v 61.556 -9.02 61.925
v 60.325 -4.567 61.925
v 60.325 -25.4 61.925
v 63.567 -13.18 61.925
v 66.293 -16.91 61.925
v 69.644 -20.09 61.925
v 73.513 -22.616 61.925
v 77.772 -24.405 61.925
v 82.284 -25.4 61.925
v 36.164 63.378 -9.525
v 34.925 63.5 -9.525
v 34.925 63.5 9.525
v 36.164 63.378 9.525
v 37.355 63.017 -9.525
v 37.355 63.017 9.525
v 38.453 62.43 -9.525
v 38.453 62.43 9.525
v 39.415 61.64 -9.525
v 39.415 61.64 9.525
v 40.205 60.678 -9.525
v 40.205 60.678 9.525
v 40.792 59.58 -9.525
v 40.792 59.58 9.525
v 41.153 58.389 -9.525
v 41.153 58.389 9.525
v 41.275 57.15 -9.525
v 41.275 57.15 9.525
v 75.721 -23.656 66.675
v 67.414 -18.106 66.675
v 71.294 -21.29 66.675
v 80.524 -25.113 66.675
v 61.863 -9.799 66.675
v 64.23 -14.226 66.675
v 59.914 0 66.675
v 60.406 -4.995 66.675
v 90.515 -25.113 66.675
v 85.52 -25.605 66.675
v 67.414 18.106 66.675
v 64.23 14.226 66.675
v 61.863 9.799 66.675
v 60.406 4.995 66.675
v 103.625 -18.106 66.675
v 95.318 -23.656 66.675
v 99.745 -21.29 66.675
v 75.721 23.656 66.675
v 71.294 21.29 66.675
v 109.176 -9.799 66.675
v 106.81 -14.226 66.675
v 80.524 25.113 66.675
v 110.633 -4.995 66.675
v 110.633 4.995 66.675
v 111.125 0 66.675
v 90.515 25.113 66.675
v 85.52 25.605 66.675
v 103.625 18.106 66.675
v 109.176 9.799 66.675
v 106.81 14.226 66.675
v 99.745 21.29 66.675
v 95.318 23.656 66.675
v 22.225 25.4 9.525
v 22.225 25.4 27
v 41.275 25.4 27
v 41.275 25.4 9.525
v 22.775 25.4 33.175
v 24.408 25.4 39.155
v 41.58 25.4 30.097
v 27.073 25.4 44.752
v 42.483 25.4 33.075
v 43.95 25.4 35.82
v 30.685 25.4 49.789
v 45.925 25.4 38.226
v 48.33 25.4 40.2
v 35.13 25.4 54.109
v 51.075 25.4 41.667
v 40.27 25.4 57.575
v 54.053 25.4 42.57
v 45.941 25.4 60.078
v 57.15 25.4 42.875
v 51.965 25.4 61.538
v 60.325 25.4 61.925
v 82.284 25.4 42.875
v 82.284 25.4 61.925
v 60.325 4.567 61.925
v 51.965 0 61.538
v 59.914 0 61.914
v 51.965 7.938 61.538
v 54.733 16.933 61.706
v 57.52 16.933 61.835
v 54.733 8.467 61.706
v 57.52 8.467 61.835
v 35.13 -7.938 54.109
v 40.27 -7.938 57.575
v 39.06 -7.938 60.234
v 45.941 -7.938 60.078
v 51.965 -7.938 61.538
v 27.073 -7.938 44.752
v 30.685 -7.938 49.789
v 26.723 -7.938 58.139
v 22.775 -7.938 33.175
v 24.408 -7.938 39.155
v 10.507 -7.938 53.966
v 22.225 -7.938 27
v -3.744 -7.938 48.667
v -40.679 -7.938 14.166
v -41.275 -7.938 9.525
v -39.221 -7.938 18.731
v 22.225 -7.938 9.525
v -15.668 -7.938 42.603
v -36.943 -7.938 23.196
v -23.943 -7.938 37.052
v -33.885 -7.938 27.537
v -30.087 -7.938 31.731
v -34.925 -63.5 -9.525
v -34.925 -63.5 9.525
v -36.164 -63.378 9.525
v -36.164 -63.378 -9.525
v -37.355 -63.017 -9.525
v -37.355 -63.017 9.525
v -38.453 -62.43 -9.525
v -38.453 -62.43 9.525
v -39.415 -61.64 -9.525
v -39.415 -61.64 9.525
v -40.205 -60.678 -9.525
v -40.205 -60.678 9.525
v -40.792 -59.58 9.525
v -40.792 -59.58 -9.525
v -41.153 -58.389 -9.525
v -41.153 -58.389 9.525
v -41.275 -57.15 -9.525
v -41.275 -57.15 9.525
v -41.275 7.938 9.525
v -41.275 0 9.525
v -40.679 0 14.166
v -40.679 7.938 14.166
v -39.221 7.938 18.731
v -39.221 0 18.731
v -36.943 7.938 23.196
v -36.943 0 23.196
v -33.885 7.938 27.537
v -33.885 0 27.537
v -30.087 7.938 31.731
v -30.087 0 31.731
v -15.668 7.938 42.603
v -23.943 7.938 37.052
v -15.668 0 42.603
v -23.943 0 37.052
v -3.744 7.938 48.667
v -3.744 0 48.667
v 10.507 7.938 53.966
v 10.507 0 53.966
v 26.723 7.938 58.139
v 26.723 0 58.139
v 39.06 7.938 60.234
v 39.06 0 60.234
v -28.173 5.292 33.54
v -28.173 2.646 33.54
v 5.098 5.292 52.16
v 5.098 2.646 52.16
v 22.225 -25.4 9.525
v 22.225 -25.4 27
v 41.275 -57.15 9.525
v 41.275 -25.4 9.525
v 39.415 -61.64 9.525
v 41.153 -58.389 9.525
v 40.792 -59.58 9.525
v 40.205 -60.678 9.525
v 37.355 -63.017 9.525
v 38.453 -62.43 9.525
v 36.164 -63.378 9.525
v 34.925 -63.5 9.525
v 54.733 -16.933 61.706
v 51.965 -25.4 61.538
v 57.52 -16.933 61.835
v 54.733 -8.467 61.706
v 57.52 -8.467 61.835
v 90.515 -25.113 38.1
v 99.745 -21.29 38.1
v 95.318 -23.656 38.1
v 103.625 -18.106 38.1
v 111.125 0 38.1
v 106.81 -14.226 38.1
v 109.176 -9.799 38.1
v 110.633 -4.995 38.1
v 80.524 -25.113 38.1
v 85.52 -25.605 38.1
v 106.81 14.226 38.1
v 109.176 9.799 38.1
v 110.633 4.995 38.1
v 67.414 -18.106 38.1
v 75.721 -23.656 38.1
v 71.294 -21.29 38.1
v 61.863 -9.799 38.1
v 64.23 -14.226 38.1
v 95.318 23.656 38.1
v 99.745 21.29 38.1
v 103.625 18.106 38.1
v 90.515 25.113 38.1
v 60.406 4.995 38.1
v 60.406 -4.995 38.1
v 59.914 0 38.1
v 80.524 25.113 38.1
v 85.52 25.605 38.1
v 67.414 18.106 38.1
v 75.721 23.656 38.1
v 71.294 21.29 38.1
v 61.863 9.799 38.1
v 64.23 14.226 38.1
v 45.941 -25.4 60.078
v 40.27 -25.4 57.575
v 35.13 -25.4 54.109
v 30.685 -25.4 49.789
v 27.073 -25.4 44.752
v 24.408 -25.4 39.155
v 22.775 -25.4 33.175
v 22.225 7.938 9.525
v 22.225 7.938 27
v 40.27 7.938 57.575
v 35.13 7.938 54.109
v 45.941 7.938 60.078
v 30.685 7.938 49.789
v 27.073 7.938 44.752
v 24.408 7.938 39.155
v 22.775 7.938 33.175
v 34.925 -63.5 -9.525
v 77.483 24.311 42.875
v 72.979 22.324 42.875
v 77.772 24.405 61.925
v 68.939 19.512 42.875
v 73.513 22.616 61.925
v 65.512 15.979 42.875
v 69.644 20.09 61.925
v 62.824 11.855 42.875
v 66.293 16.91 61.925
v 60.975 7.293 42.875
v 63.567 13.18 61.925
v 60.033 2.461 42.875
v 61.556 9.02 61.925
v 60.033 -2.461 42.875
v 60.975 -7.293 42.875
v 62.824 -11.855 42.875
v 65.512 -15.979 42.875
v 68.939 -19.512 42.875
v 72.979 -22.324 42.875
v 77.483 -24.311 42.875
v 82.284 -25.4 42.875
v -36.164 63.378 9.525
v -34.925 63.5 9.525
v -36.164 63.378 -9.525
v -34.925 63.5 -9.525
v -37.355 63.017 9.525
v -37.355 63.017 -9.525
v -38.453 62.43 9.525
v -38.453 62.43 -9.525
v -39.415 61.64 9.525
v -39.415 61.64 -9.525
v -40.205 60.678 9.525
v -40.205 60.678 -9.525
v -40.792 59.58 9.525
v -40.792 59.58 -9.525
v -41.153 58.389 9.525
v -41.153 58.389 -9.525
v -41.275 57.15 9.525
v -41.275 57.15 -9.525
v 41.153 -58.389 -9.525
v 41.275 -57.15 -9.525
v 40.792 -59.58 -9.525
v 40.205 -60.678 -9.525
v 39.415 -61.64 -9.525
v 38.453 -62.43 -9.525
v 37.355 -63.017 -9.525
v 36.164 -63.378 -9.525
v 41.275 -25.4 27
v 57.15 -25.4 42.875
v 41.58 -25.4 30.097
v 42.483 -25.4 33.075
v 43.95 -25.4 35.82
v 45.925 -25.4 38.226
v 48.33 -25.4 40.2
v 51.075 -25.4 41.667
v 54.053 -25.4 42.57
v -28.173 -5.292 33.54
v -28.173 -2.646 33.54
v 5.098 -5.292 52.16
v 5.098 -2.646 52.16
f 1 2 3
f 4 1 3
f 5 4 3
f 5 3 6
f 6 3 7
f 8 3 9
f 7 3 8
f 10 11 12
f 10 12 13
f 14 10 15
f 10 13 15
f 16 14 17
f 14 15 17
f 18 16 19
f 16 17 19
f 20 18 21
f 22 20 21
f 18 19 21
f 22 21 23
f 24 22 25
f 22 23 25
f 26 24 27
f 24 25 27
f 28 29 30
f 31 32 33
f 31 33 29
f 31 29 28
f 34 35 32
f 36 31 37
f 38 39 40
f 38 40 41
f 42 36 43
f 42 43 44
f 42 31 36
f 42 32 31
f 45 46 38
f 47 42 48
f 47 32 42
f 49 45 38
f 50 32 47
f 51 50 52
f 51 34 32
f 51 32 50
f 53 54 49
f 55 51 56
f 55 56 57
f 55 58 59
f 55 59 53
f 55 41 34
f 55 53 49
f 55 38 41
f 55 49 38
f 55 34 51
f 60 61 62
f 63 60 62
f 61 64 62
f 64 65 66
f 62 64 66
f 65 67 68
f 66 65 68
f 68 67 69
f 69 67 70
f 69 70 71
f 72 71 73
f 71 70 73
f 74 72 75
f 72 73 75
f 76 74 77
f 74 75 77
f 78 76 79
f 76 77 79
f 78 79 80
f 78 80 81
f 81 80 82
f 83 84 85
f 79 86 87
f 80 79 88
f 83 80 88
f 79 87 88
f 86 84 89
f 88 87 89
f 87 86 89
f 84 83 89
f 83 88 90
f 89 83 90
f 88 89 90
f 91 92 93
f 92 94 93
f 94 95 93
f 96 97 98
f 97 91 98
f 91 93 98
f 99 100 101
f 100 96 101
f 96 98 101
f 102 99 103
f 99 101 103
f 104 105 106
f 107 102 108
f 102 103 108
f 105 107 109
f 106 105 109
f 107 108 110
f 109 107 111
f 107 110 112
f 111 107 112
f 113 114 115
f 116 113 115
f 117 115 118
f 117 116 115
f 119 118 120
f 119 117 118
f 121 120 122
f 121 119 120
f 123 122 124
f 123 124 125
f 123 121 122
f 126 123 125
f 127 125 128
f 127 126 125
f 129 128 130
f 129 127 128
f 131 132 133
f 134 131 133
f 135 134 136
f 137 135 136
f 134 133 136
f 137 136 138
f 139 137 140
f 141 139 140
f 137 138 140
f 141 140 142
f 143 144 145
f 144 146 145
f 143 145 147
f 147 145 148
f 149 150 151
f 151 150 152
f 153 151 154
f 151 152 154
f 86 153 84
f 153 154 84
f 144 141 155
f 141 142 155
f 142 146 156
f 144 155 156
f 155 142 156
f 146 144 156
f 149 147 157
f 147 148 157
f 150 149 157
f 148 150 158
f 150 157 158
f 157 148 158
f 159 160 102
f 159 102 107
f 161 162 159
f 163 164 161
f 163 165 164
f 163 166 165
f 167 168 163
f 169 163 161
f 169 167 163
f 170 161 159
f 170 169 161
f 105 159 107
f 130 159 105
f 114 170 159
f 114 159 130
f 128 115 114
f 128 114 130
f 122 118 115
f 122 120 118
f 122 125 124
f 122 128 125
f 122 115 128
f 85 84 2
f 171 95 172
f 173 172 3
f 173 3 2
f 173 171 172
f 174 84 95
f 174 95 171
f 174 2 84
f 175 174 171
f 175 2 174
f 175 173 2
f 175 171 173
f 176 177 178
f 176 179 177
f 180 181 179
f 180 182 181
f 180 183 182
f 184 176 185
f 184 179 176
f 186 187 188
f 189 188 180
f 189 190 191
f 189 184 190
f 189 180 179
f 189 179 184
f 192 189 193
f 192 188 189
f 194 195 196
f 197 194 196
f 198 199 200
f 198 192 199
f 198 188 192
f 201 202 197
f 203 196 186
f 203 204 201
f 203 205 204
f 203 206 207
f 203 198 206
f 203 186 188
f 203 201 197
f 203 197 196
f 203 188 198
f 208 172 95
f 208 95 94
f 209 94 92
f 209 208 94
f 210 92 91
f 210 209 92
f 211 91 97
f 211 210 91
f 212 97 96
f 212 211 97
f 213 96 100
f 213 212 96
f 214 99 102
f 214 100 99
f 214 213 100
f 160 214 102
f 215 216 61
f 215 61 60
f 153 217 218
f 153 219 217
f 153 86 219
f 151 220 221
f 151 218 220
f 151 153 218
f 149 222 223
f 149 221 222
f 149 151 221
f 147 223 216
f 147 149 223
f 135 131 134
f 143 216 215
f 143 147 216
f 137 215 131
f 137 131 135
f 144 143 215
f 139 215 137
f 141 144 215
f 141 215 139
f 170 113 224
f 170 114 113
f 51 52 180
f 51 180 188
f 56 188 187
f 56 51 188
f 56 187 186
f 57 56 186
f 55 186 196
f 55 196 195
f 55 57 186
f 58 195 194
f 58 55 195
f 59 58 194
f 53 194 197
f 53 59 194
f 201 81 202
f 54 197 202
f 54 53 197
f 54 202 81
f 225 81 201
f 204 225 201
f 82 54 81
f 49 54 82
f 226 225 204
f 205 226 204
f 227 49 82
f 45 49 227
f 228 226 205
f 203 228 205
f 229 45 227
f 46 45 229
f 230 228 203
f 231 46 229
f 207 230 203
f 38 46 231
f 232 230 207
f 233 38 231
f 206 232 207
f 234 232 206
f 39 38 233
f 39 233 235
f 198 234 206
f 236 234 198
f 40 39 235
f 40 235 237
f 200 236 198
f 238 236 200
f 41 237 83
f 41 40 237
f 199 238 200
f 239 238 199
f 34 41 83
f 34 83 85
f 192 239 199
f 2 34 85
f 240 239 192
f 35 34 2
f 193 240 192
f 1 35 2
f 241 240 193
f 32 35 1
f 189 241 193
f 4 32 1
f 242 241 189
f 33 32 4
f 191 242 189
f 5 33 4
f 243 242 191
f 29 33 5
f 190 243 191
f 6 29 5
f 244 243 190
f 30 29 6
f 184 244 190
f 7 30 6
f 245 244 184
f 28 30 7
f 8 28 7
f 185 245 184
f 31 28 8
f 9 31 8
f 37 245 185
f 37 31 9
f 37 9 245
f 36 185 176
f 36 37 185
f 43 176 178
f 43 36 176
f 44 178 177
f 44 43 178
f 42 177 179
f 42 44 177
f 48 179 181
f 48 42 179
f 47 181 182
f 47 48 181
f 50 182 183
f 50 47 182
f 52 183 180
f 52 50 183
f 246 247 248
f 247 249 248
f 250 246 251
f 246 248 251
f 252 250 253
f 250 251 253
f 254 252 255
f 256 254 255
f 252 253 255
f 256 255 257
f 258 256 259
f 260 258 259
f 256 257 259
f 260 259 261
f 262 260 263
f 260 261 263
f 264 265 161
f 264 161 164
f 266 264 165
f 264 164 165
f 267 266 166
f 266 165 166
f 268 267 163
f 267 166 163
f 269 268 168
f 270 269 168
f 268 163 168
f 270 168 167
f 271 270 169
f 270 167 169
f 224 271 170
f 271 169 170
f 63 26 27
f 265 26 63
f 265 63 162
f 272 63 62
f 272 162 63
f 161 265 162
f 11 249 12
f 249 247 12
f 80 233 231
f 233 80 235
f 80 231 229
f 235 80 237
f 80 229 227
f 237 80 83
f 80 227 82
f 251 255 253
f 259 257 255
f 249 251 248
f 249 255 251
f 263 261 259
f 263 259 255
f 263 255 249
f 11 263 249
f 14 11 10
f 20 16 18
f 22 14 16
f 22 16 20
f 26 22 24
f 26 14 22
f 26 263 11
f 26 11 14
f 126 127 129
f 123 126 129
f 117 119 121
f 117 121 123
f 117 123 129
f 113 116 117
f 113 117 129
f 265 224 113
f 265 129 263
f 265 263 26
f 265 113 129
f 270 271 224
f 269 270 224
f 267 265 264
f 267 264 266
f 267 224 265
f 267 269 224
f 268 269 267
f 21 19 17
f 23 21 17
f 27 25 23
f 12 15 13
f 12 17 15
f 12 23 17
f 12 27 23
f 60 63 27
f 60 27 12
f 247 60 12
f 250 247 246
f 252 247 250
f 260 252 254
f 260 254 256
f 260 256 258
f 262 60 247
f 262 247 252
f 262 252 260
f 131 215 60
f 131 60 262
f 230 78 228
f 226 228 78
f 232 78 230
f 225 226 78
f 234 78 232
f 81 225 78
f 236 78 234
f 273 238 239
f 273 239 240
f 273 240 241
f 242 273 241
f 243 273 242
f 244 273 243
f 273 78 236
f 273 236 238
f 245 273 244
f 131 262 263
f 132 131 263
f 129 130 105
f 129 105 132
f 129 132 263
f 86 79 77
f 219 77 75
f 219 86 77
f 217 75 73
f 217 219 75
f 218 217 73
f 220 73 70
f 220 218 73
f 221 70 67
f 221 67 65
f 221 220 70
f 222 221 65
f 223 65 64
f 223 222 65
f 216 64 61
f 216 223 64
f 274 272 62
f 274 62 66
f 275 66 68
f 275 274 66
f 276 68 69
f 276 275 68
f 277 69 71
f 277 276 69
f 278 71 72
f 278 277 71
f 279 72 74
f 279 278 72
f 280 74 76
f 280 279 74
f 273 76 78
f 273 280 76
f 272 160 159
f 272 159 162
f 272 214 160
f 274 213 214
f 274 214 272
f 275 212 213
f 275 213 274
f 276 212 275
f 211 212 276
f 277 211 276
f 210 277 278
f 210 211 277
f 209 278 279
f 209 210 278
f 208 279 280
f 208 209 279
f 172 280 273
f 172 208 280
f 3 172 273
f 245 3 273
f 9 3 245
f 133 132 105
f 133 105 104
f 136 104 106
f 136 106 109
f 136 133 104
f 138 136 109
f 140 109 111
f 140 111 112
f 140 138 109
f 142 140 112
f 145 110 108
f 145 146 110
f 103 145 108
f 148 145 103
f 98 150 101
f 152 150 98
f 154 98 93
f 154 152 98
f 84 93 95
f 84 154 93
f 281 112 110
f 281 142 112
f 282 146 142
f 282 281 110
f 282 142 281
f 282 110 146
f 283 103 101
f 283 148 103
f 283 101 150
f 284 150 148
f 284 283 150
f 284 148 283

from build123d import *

# Parameters (mm, degrees)
F1_DEPTH = 63.5
F2_DEPTH = 7.9375
F3_R     = 6.35
F0_W     = 25.194674
F0_H     = 19.05
F4_DEPTH = 25.4


with BuildPart() as f1:
    # F0 (on Front) → F1 (new body, symmetric)
    with BuildSketch(Plane.XZ):
        Polygon((-41.275, -9.525), (41.275, -9.525), (41.275, 9.525), (22.225, 9.525), (-41.275, 9.525), align=None)
    extrude(amount=F1_DEPTH, both=True)

    # F0 (on Front) → F2 (join, symmetric)
    with BuildSketch(Plane.XZ):
        with BuildLine():
            add(Edge.make_bspline(
                [(-41.275, 9.525), (-40.449119, 34.956452), (0.491742, 58.062427), (51.965438, 61.538236)],
                knots=[0, 0, 0, 0, 108.503557, 108.503557, 108.503557, 108.503557], degree=3))
            Line((-41.275, 9.525), (22.225, 9.525))
            Line((22.225, 9.525), (22.225, 27.0002))
            ThreePointArc((22.225, 27.0002), (30.684679, 49.789285), (51.965438, 61.538236))
        make_face()
    extrude(amount=F2_DEPTH, both=True)

    # F3
    f3_edges = [f1.edges().sort_by_distance(p)[0] for p in [
        (41.275, -63.5, 0),
        (-41.275, -63.5, 0),
        (41.275, 63.5, 0),
        (-41.275, 63.5, 0),
    ]]
    fillet(f3_edges, radius=F3_R)

    # F0 (on Front) → F4 (join, symmetric)
    with BuildSketch(Plane.XZ):
        with BuildLine():
            Line((22.225, 9.525), (41.275, 9.525))
            Line((41.275, 9.525), (41.275, 27.0002))
            ThreePointArc((41.275, 27.0002), (45.92468, 38.22552), (57.15, 42.8752))
            Line((57.15, 42.8752), (60.325, 42.8752))
            Line((60.325, 42.8752), (60.325, 61.9252))
            add(Edge.make_bspline(
                [(51.965438, 61.538236), (54.723241, 61.724459), (57.511278, 61.854334), (60.325, 61.9252)],
                knots=[108.503557, 108.503557, 108.503557, 108.503557, 114.316845, 114.316845, 114.316845, 114.316845], degree=3))
            ThreePointArc((51.965438, 61.538236), (30.684679, 49.789285), (22.225, 27.0002))
            Line((22.225, 27.0002), (22.225, 9.525))
        make_face()
        with Locations((72.922337, 52.4002)):
            Rectangle(F0_W, F0_H)
    extrude(amount=F4_DEPTH, both=True)

    # F0 (on Front) → F5 (revolve)
    with BuildSketch(Plane.XZ):
        Polygon((85.519674, 66.675), (85.519674, 61.9252), (85.519674, 42.8752), (85.519674, 38.1), (111.125, 38.1), (111.125, 66.675), align=None)
    revolve(axis=Axis((85.519674, 0, 52.3875), (0, 0, 1)))


solid = f1.part
